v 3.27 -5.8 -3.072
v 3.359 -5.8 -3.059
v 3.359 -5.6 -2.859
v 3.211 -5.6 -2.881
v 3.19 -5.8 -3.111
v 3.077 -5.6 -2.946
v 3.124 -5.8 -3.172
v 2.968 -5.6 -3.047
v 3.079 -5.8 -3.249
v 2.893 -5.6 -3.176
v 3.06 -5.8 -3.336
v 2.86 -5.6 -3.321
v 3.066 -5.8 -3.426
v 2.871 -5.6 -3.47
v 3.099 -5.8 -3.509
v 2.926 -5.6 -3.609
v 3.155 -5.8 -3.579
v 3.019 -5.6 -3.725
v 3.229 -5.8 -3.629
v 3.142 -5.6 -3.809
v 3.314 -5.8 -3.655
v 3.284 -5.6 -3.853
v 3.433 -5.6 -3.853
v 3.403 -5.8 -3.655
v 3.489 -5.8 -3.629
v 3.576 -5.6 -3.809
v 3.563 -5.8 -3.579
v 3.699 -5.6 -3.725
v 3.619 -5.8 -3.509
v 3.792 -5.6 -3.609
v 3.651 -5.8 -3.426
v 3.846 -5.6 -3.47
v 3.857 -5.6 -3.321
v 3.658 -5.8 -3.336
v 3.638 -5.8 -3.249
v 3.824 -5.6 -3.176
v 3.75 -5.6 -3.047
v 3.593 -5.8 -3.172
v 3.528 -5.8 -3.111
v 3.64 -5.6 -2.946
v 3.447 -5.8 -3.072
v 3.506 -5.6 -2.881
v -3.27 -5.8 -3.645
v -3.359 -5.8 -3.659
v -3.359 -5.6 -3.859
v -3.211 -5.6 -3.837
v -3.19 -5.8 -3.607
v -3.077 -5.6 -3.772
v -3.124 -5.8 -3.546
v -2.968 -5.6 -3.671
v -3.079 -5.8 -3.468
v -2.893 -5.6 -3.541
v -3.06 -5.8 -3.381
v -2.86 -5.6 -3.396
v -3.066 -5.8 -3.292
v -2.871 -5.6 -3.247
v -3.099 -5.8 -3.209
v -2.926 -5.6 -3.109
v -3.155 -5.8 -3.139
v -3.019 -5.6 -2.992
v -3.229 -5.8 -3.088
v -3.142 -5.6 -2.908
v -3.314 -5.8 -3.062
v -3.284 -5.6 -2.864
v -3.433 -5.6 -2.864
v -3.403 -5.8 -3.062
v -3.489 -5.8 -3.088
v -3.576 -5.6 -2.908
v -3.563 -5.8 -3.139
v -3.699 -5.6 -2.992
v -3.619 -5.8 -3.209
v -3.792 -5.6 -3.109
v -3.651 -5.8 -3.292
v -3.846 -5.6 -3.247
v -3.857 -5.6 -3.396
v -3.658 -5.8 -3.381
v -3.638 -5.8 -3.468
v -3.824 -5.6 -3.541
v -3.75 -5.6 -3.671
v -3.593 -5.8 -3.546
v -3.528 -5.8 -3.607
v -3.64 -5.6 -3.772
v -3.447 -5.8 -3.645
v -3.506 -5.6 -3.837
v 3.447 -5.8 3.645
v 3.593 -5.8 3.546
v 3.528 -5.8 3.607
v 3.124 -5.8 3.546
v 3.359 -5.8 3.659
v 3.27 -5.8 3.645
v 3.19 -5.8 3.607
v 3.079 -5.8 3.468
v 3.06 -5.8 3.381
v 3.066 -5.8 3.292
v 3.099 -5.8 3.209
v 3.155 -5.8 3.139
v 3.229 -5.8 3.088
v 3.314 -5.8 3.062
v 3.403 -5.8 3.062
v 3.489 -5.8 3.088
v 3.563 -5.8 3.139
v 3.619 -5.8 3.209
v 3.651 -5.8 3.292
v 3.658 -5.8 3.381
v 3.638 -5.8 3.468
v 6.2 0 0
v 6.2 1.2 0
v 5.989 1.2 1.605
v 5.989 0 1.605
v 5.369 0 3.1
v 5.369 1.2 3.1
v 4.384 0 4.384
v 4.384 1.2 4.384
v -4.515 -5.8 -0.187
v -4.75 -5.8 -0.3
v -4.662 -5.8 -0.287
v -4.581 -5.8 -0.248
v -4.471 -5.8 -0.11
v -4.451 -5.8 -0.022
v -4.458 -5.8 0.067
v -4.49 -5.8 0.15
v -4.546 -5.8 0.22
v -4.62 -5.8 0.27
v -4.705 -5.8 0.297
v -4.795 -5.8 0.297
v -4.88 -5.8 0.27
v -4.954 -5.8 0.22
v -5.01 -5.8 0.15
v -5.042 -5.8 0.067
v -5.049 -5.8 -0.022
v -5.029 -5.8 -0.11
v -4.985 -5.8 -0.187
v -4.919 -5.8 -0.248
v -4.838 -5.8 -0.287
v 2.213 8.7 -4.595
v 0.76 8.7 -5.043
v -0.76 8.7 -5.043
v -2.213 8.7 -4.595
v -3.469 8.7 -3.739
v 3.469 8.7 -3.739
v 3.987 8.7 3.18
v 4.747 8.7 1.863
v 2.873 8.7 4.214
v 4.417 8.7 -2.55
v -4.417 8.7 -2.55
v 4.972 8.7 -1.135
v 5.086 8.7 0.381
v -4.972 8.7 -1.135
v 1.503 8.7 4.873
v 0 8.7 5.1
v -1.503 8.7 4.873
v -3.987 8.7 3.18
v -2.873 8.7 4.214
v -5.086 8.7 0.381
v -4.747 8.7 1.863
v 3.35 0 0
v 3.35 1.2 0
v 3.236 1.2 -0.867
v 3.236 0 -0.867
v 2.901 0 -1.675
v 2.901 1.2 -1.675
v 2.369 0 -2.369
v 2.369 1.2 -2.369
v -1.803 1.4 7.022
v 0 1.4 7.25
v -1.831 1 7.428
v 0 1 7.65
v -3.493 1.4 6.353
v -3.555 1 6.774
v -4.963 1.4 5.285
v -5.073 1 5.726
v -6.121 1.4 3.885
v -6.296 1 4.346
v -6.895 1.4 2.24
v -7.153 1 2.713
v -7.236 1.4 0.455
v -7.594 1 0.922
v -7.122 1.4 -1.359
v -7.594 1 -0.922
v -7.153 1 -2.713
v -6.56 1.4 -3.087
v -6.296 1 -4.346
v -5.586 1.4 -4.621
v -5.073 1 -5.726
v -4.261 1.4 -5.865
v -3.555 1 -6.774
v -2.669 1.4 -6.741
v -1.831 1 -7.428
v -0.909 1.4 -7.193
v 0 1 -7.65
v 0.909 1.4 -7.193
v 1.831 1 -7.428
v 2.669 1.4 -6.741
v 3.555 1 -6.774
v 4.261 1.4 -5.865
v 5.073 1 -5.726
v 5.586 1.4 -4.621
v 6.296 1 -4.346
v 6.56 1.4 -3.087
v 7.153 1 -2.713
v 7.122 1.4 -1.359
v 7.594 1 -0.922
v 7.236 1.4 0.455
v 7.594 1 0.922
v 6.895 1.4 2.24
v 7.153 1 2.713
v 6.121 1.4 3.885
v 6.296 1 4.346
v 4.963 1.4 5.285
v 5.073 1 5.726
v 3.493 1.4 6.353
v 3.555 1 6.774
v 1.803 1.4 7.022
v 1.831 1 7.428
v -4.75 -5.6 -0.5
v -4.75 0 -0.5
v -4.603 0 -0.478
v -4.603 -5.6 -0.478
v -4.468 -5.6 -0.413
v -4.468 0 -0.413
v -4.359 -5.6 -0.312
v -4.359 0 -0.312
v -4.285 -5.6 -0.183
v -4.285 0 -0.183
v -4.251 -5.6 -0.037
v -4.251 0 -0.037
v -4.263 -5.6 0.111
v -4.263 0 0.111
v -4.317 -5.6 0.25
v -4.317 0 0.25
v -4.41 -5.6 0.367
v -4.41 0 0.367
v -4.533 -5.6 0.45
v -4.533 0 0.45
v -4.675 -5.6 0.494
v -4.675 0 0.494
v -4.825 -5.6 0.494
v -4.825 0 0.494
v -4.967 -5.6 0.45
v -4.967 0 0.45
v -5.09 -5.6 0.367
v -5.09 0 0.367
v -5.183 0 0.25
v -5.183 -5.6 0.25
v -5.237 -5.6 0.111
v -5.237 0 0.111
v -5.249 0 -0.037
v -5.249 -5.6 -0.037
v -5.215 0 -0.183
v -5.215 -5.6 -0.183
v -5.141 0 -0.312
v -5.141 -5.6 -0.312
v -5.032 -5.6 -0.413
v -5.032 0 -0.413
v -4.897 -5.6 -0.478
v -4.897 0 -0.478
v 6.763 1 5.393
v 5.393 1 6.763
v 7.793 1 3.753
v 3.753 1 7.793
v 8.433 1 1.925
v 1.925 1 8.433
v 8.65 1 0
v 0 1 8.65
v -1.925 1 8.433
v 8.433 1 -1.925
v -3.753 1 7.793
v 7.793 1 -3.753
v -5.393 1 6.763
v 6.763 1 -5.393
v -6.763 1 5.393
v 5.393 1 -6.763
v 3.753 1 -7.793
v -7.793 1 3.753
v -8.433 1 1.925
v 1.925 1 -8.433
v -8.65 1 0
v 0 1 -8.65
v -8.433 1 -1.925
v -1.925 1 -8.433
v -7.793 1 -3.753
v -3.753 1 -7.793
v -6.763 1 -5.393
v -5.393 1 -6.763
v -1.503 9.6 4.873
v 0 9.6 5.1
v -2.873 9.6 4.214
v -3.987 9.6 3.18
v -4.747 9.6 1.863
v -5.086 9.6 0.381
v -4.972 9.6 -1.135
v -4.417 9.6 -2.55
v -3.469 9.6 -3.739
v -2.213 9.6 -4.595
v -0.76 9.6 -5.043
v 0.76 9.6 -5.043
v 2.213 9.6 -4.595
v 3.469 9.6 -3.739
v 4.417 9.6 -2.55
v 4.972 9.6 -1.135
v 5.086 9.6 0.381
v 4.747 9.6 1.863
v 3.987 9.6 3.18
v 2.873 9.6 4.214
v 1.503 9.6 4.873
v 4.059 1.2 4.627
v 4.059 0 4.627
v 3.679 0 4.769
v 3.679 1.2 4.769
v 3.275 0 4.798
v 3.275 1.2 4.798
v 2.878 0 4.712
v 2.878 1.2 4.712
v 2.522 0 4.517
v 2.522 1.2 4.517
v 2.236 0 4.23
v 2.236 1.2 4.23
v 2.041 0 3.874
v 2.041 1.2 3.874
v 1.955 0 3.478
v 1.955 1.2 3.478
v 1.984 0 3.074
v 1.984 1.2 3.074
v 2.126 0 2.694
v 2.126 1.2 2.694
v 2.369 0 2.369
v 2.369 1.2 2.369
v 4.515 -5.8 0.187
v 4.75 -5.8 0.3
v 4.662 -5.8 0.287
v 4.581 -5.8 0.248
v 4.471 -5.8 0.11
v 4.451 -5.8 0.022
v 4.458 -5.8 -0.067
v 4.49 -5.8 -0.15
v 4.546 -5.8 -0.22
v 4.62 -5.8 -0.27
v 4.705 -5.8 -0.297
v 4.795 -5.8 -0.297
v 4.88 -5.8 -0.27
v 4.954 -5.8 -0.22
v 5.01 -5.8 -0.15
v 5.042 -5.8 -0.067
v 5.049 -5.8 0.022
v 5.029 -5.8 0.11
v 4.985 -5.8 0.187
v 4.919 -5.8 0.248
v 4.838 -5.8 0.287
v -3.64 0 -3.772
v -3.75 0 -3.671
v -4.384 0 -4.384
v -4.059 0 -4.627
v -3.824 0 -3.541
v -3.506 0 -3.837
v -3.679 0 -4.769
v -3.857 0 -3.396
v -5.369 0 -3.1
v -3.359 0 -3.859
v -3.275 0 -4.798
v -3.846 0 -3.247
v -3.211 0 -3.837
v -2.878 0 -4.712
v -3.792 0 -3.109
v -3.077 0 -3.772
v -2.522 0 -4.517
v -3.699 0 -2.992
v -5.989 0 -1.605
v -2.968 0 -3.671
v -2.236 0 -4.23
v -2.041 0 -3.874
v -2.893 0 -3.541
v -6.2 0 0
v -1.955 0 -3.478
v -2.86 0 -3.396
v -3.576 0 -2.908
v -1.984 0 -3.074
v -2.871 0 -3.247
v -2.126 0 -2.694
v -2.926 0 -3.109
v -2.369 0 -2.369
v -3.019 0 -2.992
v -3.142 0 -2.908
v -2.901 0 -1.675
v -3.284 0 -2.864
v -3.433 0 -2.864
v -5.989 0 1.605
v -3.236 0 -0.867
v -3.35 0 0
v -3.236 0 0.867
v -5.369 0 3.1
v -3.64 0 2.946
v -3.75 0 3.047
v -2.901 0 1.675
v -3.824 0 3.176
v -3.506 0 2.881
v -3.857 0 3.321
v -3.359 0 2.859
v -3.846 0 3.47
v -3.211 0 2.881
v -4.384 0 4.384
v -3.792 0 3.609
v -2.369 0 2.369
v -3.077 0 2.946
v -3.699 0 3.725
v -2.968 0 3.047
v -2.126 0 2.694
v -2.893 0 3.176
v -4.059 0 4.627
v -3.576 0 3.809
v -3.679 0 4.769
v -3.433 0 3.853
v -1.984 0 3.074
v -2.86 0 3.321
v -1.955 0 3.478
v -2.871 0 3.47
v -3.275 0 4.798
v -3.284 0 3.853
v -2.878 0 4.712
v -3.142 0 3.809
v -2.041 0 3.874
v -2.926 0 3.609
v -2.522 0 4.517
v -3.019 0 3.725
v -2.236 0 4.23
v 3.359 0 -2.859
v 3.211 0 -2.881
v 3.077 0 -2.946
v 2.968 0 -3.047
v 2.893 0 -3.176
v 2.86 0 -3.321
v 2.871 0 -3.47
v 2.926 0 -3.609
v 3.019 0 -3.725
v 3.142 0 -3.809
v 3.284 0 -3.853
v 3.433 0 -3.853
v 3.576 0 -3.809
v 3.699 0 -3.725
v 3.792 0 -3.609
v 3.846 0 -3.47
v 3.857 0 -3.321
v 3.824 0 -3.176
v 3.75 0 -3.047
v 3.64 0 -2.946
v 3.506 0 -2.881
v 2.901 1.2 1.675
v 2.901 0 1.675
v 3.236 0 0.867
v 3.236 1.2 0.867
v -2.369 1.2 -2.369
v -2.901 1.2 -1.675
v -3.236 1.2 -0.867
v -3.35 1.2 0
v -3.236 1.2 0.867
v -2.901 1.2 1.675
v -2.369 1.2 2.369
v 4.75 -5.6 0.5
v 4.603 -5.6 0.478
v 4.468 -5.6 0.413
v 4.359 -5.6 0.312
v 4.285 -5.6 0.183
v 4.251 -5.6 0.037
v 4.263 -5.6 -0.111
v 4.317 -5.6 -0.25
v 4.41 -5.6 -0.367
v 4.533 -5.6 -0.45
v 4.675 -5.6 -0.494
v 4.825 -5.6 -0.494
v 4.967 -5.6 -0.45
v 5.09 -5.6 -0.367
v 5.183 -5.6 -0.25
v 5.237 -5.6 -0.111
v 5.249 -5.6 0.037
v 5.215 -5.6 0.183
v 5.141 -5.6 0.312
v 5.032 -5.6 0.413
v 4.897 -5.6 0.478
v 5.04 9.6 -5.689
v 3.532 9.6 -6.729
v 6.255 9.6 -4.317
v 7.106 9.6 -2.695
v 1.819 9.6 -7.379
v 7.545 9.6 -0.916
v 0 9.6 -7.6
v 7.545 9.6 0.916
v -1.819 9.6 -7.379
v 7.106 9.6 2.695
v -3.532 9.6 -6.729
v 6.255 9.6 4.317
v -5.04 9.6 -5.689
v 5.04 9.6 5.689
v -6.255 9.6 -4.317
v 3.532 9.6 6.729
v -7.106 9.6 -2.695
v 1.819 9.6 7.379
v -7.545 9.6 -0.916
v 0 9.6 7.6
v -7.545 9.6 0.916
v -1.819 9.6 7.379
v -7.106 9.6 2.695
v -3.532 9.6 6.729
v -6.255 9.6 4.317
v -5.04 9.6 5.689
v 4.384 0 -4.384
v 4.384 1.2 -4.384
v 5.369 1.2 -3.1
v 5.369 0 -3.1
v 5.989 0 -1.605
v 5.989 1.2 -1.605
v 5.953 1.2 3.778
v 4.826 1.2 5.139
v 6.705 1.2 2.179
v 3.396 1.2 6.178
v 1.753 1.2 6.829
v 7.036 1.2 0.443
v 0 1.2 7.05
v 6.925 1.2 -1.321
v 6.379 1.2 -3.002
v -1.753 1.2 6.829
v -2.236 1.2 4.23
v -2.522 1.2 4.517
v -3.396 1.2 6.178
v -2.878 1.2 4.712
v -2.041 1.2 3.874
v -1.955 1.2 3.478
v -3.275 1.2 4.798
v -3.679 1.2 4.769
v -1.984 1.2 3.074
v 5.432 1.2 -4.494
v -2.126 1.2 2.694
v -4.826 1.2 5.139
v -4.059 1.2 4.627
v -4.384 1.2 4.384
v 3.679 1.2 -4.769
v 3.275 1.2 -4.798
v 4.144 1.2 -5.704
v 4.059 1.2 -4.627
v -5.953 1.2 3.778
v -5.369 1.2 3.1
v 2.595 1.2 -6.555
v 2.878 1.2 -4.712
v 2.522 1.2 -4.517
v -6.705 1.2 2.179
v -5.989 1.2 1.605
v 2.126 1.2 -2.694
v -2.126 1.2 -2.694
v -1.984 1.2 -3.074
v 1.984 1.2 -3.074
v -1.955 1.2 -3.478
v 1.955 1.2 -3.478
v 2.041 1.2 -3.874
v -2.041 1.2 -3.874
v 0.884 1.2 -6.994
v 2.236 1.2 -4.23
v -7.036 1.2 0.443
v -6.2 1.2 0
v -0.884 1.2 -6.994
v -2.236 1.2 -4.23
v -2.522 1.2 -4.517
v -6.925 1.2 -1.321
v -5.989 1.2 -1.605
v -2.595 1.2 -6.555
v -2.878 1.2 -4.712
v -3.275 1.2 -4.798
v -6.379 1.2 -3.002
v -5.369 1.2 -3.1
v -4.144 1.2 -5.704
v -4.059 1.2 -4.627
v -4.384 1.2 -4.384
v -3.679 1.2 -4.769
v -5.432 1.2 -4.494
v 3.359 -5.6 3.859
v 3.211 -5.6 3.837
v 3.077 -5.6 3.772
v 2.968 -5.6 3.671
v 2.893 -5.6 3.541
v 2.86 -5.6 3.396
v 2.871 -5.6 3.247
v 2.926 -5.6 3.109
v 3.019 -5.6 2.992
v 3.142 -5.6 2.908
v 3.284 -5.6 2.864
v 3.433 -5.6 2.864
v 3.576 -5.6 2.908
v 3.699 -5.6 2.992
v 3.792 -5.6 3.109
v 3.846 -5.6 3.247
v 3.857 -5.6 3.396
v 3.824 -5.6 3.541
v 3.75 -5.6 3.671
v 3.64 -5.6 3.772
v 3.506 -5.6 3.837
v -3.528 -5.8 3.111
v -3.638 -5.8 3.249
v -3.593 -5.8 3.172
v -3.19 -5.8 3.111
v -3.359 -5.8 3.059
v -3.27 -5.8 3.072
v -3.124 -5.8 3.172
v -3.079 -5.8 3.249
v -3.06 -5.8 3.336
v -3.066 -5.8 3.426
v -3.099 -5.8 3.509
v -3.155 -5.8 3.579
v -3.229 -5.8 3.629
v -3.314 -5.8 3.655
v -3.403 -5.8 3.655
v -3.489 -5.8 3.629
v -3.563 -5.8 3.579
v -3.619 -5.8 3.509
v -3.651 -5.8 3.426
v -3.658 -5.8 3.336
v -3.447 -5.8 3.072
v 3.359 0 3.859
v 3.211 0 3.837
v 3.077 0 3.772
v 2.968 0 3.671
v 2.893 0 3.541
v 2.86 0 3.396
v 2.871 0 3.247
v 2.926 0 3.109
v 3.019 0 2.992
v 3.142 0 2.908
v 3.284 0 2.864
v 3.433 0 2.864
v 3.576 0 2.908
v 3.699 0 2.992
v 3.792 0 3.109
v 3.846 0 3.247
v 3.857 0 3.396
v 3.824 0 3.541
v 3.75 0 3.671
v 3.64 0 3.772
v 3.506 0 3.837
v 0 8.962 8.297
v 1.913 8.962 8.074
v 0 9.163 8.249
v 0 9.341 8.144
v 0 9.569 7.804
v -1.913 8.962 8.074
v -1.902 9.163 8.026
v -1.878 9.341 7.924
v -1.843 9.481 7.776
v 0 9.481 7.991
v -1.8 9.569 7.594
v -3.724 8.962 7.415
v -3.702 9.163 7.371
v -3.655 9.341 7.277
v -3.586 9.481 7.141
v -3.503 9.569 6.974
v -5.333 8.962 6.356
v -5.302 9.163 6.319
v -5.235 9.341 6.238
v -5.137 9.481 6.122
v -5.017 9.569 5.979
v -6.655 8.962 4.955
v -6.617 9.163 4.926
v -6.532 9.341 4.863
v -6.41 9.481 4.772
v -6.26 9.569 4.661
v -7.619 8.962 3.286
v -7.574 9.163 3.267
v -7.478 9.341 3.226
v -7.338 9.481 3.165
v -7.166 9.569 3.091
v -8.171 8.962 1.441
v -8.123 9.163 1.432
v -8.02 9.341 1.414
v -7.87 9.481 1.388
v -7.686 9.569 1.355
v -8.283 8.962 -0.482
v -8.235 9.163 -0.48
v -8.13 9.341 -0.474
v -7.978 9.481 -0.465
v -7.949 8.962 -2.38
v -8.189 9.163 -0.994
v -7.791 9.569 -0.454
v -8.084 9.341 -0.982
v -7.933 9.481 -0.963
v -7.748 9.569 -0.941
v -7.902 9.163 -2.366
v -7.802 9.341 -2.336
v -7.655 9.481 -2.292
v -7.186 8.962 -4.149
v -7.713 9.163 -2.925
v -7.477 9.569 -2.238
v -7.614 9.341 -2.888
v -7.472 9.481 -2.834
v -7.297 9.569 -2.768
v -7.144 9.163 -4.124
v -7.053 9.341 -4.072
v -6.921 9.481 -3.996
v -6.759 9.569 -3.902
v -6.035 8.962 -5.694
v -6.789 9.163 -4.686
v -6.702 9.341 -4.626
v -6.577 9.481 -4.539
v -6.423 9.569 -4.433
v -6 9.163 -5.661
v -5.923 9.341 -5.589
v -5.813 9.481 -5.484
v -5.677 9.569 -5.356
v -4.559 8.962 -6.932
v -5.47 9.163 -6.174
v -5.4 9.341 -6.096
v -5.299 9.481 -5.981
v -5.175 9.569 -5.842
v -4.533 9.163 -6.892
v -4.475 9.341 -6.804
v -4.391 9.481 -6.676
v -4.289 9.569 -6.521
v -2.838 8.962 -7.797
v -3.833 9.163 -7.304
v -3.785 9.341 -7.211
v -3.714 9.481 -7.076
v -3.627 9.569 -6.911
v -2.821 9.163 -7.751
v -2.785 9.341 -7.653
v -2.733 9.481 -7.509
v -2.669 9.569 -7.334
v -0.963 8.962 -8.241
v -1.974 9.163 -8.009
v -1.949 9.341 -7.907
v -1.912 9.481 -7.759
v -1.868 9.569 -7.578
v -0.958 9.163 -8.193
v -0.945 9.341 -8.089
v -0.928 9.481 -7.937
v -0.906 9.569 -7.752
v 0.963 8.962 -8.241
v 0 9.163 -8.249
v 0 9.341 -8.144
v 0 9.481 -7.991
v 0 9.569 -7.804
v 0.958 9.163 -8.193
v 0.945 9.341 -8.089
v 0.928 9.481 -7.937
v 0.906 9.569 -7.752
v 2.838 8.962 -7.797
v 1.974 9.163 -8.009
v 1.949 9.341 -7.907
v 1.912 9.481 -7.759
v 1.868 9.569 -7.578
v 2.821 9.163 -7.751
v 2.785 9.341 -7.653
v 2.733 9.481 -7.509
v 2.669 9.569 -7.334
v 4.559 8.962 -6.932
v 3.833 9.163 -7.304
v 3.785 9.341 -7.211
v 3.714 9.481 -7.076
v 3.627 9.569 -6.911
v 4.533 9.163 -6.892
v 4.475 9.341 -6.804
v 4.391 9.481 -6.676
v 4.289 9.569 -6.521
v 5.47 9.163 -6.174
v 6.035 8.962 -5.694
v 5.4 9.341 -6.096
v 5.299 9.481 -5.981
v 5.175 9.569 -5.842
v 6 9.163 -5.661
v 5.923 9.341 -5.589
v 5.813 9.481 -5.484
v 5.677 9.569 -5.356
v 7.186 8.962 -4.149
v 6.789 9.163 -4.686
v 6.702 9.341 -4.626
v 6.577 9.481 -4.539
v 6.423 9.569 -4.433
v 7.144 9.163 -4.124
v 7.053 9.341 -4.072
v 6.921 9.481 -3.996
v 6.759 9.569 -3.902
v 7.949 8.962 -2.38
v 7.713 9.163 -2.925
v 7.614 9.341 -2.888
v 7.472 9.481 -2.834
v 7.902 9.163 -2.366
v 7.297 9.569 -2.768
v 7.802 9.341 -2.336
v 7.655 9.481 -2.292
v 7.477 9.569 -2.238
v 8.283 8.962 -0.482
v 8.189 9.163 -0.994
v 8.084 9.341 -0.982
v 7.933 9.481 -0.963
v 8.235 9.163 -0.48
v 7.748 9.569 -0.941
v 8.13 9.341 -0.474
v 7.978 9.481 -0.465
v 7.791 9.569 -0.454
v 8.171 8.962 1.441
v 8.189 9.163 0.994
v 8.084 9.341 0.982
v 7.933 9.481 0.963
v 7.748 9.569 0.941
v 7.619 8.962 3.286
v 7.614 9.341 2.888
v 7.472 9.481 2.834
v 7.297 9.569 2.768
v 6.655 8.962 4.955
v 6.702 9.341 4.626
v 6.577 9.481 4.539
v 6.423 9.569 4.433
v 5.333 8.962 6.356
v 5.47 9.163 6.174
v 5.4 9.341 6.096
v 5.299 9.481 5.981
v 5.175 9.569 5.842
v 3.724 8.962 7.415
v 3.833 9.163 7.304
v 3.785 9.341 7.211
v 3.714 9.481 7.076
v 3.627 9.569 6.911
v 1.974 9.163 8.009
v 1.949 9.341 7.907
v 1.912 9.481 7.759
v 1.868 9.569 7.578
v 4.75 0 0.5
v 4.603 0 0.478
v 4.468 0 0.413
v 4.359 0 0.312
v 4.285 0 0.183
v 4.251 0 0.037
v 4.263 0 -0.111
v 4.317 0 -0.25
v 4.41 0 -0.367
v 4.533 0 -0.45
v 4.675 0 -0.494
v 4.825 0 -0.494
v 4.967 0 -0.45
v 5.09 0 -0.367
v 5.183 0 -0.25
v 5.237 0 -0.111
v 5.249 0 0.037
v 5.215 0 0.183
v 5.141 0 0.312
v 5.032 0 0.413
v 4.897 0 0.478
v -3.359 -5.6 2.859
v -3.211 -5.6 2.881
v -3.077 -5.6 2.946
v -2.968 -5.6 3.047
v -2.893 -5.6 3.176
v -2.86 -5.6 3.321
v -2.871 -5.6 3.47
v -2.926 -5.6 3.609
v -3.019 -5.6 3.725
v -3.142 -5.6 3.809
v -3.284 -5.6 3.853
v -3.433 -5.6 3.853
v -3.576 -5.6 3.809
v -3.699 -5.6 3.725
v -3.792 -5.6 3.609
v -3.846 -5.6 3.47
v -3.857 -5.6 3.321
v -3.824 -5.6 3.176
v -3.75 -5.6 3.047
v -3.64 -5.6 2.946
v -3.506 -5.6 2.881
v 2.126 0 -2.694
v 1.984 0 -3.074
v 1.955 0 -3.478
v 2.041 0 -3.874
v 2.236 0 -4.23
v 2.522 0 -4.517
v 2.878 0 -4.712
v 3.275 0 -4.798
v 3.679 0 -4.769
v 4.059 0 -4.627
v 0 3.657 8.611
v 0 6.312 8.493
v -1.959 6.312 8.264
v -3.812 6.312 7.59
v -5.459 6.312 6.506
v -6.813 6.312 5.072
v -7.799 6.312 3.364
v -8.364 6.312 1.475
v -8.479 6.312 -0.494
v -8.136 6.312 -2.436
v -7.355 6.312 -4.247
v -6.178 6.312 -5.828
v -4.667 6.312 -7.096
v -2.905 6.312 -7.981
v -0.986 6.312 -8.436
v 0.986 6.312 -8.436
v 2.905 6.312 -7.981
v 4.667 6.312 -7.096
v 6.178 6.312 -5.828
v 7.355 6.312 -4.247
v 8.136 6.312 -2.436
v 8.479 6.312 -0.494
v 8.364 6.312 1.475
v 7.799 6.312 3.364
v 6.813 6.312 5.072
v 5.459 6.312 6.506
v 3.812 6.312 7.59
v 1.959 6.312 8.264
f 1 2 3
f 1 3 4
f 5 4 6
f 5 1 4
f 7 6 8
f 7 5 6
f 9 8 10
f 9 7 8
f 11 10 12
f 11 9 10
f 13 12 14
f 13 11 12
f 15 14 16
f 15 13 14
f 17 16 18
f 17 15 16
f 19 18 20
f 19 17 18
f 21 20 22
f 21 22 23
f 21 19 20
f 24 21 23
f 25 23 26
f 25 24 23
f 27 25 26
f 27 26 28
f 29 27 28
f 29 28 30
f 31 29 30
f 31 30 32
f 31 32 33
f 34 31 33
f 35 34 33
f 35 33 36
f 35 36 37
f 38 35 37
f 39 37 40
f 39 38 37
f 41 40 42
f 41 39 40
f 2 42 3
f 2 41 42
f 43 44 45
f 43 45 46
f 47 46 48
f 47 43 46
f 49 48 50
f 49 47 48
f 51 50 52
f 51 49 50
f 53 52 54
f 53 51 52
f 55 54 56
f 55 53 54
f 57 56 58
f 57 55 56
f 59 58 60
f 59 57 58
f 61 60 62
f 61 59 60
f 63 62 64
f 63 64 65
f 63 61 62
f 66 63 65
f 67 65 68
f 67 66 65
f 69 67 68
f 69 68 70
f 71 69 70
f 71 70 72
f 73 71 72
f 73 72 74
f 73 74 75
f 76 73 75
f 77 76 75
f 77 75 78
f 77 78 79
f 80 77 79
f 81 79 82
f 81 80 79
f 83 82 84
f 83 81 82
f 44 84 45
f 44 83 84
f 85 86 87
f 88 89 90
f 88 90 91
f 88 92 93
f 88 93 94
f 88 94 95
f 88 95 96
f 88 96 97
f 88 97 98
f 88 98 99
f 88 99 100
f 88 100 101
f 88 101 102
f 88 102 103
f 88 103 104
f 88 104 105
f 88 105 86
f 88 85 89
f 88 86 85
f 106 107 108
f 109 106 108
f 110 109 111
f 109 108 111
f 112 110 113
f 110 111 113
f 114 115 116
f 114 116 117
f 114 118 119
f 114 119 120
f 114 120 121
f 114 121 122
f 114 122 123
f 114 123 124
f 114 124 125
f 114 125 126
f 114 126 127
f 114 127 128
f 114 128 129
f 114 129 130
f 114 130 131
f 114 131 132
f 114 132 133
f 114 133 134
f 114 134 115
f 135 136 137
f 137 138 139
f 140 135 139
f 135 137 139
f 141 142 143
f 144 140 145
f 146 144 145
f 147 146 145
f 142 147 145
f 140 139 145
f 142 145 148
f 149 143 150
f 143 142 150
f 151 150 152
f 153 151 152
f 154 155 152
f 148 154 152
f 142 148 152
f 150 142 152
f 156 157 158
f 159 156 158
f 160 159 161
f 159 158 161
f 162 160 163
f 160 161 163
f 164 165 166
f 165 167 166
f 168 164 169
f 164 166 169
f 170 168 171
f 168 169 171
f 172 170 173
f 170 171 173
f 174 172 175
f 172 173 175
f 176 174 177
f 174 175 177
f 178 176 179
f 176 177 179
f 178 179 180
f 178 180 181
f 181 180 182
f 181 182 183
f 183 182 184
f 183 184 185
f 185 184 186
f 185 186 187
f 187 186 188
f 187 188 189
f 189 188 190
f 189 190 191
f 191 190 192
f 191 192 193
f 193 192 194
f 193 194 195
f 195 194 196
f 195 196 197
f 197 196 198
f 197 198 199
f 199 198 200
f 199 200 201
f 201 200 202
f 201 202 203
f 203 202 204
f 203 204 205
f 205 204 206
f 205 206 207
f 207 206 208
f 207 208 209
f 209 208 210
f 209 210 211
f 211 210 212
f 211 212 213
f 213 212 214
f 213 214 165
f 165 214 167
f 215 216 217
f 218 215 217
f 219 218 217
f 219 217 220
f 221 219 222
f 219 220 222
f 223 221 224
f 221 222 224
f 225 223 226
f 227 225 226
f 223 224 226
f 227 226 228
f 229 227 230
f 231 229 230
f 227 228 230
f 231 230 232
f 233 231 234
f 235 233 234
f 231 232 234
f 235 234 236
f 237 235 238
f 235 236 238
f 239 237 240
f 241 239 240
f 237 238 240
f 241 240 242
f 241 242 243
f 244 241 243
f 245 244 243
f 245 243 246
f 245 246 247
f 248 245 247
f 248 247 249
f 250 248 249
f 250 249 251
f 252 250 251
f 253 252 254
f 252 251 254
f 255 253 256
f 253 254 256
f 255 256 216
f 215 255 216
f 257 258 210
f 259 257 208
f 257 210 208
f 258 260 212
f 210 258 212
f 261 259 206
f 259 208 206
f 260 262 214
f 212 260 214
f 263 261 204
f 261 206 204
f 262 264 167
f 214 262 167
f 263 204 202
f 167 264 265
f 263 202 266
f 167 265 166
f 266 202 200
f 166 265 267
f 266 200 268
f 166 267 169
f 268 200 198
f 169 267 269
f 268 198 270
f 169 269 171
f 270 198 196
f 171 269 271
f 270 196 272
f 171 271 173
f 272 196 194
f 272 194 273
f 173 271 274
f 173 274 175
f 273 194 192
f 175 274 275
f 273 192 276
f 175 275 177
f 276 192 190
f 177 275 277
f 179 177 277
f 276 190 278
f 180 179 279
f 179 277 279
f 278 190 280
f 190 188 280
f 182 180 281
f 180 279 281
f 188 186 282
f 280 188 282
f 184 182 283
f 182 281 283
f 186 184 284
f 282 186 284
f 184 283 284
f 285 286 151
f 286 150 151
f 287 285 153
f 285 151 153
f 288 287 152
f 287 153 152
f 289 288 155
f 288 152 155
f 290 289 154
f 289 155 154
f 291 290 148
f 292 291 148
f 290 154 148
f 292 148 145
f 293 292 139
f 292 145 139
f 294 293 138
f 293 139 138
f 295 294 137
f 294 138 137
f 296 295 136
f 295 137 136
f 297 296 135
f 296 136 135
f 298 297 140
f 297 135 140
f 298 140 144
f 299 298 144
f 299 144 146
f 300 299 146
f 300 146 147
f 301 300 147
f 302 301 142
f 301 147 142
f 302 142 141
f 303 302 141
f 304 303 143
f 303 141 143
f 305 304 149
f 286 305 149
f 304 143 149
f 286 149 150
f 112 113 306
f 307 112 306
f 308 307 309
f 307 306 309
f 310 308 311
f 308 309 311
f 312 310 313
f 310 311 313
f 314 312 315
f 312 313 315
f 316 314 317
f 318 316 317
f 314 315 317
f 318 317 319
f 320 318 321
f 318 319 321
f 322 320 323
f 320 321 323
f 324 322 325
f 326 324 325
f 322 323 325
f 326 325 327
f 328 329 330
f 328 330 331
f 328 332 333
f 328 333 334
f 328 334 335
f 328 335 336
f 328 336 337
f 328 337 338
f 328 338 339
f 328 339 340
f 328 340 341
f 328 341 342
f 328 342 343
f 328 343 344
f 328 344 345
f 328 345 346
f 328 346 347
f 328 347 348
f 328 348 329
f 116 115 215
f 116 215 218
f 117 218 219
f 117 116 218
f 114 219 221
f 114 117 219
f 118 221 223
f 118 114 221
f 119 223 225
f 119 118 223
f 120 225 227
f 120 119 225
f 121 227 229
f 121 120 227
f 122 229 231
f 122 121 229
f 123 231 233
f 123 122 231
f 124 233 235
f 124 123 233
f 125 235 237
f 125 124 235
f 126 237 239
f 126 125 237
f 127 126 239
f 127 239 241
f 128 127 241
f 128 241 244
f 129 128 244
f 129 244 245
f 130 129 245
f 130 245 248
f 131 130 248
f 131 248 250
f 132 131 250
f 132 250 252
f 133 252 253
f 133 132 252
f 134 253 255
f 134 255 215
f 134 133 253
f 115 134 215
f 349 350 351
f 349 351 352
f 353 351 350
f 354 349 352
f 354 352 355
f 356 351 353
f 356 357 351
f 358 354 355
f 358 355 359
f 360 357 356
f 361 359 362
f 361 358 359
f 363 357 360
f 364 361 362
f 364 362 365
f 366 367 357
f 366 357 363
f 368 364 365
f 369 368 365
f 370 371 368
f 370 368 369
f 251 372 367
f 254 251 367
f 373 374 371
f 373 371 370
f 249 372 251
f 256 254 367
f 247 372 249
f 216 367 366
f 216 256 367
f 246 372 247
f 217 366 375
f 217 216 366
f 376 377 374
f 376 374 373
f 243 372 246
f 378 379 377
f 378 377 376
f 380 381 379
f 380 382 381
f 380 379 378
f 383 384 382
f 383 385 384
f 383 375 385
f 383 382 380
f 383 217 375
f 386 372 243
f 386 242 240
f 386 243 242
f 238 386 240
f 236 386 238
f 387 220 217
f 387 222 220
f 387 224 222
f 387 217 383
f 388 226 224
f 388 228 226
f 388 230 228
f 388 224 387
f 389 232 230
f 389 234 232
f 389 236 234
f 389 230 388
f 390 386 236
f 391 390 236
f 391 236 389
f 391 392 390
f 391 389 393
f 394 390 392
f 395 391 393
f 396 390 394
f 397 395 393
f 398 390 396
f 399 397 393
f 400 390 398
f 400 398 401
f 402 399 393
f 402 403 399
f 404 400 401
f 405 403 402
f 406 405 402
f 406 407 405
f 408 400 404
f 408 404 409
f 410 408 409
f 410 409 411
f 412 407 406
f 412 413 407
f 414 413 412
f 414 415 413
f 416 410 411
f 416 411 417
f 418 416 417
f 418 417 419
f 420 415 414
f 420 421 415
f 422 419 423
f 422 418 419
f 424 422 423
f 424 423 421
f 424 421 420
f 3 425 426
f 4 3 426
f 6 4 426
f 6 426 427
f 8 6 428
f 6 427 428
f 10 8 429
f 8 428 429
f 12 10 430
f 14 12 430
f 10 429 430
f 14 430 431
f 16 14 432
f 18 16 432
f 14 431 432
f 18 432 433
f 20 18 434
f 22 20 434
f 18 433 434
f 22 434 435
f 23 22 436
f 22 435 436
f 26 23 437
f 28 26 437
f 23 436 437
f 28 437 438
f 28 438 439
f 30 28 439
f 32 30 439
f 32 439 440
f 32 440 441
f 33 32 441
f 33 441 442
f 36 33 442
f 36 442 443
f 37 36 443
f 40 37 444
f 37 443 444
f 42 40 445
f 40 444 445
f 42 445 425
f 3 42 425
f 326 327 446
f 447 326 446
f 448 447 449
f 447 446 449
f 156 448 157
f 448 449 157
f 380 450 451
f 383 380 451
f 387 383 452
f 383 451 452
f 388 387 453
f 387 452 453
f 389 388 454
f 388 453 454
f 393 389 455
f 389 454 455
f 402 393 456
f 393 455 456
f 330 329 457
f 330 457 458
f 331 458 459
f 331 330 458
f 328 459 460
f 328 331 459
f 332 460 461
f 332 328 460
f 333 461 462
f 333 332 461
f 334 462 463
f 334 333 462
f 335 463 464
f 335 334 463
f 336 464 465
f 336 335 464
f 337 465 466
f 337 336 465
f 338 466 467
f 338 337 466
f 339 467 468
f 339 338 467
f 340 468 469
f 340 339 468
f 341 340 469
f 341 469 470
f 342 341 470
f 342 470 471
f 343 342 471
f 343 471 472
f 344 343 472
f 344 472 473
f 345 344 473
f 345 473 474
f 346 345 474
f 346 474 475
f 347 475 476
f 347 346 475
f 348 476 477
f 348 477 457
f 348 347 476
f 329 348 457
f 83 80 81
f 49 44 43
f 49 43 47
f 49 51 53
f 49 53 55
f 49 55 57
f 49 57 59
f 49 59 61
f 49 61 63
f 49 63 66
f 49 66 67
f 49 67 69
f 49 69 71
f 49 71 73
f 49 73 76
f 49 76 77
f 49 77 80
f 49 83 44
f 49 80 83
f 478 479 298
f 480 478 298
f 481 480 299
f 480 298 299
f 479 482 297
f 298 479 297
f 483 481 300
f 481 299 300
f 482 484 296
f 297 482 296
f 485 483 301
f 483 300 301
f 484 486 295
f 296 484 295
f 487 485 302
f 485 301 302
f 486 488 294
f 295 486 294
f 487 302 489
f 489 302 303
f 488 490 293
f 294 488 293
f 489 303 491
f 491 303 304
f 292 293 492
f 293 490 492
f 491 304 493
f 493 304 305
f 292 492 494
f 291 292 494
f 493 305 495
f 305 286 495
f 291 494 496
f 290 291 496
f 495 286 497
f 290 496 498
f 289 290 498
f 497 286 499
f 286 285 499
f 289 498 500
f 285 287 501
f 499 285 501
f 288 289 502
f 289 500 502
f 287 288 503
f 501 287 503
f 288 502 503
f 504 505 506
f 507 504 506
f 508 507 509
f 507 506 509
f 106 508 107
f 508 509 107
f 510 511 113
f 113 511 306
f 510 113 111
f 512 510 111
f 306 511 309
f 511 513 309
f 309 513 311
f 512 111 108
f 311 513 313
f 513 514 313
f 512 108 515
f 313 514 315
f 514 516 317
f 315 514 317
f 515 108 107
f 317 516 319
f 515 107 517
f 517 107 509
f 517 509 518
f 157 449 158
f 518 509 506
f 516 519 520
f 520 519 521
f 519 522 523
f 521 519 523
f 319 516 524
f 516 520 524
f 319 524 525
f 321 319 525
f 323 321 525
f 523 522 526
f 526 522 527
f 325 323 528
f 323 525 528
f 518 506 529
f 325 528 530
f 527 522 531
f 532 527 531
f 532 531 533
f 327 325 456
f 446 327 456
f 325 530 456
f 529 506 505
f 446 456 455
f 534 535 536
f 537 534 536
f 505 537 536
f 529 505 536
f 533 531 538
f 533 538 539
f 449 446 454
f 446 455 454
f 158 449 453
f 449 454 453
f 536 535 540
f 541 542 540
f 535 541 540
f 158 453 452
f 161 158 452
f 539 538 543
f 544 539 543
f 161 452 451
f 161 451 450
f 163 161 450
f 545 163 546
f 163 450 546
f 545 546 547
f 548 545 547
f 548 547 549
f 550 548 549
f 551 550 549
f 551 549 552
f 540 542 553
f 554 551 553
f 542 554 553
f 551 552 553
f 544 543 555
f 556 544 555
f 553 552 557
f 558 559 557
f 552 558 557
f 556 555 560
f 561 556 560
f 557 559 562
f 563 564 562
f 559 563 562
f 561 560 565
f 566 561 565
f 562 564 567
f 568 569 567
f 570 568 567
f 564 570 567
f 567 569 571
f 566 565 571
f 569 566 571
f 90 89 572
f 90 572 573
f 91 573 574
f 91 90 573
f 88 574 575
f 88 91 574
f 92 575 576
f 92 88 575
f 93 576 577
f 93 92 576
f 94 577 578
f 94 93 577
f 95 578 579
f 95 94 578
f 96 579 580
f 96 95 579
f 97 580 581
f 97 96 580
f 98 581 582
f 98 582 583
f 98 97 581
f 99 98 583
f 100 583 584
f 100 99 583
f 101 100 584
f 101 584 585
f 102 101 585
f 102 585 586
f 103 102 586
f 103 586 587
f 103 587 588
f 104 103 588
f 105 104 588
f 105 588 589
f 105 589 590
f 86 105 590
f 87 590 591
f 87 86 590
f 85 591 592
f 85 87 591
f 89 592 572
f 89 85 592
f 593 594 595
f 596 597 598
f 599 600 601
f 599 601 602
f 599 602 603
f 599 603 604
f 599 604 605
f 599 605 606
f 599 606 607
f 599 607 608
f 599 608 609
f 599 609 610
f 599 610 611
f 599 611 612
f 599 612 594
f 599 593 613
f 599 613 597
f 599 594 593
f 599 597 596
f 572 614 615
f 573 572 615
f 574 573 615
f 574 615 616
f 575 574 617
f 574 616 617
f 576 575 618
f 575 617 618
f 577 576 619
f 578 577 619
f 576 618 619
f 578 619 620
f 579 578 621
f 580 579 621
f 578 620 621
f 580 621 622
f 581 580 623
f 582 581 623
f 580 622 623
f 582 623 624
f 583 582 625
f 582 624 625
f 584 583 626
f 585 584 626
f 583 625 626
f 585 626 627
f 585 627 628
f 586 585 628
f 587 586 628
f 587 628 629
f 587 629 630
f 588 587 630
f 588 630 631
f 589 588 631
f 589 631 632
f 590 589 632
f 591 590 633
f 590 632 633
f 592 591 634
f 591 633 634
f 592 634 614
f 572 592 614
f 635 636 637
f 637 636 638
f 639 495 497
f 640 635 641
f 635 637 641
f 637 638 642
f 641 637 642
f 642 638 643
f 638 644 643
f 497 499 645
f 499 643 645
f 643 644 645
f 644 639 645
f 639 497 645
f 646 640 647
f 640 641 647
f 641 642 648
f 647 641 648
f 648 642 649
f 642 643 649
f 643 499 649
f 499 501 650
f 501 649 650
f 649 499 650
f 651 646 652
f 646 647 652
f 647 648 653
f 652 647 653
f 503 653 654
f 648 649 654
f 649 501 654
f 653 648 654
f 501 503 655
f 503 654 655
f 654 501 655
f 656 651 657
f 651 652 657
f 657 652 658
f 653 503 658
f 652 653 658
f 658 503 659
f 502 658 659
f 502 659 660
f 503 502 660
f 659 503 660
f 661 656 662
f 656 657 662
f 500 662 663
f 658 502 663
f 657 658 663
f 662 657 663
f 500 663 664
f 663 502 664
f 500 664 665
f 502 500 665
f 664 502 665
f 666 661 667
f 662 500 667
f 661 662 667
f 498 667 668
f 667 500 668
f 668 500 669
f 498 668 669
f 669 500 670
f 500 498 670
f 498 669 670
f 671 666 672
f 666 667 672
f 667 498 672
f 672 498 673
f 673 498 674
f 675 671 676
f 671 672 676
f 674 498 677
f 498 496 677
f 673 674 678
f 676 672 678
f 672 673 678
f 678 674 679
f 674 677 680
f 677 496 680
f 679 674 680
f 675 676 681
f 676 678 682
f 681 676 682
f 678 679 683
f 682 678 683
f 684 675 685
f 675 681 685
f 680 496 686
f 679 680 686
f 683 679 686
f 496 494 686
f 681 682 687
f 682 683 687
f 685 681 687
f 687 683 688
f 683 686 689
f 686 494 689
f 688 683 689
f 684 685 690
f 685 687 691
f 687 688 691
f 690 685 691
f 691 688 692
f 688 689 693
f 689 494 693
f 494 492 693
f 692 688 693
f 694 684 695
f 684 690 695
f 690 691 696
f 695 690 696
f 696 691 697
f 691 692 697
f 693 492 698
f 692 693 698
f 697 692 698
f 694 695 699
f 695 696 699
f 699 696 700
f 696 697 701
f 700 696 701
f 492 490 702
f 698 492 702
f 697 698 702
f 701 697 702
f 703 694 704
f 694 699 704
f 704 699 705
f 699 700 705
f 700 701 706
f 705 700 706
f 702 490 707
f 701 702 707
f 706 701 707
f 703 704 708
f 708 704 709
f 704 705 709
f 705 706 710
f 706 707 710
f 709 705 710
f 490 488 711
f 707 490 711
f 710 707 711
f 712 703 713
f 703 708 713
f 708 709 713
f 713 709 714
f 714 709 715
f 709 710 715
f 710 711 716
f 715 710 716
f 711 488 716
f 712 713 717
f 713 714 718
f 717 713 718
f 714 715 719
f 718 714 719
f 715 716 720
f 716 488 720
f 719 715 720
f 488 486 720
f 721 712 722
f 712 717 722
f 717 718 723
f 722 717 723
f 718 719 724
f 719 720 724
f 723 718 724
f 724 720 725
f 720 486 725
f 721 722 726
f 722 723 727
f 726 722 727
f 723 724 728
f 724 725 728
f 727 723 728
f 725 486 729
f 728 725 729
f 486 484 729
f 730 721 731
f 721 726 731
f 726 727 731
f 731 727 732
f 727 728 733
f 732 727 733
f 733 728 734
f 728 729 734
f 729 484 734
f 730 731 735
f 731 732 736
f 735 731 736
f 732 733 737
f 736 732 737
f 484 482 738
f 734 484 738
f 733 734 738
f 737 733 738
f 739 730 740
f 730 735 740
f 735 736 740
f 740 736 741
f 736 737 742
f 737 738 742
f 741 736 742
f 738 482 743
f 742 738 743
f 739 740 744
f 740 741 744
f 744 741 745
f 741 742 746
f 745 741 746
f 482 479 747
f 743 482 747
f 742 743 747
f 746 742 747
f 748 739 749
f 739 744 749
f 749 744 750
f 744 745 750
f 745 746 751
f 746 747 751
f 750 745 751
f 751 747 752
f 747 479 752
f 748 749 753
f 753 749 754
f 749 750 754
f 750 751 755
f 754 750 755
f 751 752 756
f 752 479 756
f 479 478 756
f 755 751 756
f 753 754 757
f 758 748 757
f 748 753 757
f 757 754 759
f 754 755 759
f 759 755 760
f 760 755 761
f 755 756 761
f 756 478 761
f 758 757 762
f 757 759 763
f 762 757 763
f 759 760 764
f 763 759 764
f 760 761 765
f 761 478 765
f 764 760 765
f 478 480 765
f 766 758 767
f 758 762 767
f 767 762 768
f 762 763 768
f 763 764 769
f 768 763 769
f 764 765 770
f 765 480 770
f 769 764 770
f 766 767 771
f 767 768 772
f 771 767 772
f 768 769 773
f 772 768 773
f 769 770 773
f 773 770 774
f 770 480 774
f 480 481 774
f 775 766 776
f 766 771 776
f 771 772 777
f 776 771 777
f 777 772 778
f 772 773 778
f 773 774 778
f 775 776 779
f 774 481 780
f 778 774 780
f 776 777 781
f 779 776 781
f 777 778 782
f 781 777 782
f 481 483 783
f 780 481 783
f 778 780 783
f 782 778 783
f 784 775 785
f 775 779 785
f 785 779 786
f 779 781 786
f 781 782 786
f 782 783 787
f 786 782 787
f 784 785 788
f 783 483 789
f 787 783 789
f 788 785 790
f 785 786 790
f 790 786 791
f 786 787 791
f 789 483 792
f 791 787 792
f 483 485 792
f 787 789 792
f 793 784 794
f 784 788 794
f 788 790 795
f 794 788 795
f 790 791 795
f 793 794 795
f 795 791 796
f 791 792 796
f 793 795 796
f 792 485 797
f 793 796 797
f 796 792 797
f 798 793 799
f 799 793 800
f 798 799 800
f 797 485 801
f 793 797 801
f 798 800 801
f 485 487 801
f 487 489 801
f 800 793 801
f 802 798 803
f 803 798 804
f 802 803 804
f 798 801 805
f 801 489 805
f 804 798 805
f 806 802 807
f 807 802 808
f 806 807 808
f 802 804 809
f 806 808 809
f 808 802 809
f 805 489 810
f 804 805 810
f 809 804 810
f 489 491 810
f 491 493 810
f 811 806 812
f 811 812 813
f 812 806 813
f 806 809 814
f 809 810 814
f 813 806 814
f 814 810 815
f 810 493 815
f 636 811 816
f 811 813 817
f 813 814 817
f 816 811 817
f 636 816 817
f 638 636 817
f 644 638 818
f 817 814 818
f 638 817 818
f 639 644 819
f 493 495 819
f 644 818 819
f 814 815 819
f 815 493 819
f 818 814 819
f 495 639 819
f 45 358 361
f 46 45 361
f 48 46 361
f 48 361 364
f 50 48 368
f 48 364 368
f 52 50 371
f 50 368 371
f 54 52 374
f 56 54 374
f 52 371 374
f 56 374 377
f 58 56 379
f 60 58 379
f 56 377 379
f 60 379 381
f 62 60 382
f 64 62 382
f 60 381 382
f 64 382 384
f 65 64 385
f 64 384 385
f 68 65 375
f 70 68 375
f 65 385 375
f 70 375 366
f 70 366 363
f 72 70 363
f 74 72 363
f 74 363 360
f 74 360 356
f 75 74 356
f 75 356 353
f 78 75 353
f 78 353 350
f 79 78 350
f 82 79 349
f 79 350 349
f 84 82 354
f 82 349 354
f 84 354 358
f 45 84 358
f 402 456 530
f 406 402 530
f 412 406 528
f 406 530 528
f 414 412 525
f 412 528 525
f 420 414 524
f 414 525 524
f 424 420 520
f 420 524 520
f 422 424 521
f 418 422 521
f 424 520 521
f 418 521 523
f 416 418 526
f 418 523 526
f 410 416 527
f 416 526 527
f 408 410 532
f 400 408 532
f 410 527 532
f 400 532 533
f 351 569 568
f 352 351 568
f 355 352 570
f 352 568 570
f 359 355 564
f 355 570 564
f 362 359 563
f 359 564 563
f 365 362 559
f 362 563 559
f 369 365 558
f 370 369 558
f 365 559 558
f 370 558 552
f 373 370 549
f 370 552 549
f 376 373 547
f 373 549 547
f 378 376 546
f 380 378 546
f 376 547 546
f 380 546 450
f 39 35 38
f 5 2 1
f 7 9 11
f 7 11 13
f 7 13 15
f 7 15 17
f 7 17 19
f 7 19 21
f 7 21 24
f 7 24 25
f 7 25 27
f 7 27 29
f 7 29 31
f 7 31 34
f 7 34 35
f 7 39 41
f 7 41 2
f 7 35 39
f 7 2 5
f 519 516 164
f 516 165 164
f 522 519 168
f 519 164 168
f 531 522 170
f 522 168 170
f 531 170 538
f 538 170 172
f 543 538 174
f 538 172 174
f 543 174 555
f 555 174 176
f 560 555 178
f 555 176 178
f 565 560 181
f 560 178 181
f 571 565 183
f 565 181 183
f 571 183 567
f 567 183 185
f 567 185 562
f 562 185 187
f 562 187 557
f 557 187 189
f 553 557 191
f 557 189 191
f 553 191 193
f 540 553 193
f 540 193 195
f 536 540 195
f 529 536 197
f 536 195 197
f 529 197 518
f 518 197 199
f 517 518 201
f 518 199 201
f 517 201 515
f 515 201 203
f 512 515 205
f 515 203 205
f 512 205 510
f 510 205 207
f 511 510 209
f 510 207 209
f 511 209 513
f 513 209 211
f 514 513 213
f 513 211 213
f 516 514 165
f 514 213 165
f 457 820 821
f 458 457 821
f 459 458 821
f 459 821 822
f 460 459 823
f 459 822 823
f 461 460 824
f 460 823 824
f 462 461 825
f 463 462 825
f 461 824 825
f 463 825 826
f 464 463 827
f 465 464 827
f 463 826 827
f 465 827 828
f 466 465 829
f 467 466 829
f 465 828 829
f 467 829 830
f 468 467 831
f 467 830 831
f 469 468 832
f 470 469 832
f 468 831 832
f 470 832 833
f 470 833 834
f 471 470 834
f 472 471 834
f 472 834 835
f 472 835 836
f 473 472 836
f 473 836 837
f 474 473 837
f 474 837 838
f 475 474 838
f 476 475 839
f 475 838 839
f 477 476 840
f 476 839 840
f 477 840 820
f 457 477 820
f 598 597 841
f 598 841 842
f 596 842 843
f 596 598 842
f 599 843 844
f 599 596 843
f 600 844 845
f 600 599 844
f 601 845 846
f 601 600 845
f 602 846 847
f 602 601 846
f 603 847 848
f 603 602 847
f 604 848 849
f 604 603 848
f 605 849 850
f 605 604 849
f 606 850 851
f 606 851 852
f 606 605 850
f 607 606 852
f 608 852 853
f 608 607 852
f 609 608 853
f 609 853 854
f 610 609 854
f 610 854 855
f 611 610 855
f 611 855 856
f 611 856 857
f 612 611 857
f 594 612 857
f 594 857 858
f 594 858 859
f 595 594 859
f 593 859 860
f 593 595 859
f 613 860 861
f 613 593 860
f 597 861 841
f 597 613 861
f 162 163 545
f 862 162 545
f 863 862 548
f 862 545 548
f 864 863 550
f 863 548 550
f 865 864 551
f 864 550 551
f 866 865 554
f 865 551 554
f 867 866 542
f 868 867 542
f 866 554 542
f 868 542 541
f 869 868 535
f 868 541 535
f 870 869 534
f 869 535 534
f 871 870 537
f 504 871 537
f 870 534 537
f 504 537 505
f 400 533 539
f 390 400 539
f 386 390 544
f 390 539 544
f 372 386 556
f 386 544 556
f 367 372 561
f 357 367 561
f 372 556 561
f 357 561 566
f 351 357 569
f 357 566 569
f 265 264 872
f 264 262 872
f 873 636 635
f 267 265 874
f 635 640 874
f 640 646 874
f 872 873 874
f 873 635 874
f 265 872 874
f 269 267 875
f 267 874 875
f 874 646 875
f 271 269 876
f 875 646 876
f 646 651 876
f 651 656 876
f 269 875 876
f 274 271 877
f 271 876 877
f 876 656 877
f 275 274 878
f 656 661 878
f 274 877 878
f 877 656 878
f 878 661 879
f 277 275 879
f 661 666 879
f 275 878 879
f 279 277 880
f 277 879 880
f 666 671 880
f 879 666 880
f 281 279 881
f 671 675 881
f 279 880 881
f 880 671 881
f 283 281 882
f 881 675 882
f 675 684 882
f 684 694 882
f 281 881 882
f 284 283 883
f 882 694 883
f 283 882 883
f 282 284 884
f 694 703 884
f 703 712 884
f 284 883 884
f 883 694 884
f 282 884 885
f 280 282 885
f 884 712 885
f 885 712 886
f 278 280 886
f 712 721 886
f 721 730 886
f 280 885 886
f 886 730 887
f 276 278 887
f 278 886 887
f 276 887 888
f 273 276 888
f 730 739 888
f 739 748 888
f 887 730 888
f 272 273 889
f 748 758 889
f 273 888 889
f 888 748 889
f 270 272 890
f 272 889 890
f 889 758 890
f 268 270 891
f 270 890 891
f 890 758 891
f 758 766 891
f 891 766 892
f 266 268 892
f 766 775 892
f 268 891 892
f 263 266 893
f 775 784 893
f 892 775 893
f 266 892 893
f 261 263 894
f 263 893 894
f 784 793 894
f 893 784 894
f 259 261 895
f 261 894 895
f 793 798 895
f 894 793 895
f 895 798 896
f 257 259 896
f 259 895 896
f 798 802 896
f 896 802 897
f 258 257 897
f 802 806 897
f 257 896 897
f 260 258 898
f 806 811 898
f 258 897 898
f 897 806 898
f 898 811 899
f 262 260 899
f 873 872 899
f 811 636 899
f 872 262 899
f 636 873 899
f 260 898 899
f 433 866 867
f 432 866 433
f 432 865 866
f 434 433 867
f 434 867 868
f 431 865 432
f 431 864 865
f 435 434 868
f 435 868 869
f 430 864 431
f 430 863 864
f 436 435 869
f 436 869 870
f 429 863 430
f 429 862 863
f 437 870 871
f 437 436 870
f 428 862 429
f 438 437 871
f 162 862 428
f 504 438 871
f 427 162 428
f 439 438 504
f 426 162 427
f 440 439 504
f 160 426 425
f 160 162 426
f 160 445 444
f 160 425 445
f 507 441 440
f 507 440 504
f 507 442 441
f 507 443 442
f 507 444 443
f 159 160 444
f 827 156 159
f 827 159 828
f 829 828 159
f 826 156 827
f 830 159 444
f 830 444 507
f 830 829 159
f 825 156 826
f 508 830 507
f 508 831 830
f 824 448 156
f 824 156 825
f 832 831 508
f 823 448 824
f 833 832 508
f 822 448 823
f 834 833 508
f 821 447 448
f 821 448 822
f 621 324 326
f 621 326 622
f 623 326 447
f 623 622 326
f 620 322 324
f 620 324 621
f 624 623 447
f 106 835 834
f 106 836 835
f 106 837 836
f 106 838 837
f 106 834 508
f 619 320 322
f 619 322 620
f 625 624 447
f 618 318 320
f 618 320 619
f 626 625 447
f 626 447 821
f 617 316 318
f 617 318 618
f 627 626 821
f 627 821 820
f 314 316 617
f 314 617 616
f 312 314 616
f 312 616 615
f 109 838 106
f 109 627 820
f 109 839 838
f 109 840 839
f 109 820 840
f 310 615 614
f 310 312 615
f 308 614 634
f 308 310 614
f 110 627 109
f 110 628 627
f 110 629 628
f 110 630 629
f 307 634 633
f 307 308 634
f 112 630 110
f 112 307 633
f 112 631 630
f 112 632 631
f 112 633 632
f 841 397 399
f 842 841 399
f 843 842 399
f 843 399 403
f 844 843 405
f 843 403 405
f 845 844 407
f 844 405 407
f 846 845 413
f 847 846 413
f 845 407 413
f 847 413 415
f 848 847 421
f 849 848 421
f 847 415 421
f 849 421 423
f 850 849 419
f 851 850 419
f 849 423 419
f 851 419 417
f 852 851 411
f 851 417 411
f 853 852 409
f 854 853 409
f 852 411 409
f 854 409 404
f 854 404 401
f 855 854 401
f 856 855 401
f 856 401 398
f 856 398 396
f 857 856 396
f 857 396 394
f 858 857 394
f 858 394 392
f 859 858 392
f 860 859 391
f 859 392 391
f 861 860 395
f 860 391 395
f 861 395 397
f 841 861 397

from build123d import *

# Parameters (mm, degrees)
EXTRUDE_1_DEPTH = 1.2
SKETCH_3_R      = 0.5
EXTRUDE_2_DEPTH = 5.8
CHAMFER_1_SIZE  = 0.2


with BuildPart() as part:
    # Эскиз1 → Повернуть1 (revolve)
    with BuildSketch(Plane(origin=(0, 0, 0), x_dir=(0, 0, -1), z_dir=(1, 0, 0))):
        with BuildLine():
            Line((0, 1.2), (-7.05, 1.2))
            Line((-7.05, 1.2), (-7.25, 1.4))
            Line((-7.25, 1.4), (-7.65, 1))
            Line((-7.65, 1), (-8.65, 1))
            ThreePointArc((-8.65, 1), (-8.561771126, 4.984856949), (-8.297257426, 8.96190381))
            ThreePointArc((-8.297257426, 8.96190381), (-8.072581915, 9.416397457), (-7.6, 9.6))
            Line((-7.6, 9.6), (-5.1, 9.6))
            Line((-5.1, 9.6), (-5.1, 8.7))
            Line((-5.1, 8.7), (0, 8.7))
            Line((0, 8.7), (0, 1.2))
        make_face()
    revolve(axis=Axis((0, 8.7, 0), (0, -1, 0)))

    # Эскиз2 → Бобышка-Вытянуть1 (add)
    with BuildSketch(Plane.XZ.offset(-1.2)):
        with BuildLine():
            ThreePointArc((-2.368807717, 2.368807717), (-2.368807717, 4.384062043), (-4.384062043, 4.384062043))
            ThreePointArc((-4.384062043, 4.384062043), (-6.2, 0), (-4.384062043, -4.384062043))
            ThreePointArc((-4.384062043, -4.384062043), (-2.368807717, -4.384062043), (-2.368807717, -2.368807717))
            ThreePointArc((-2.368807717, -2.368807717), (-3.35, 0), (-2.368807717, 2.368807717))
        make_face()
        with BuildLine():
            ThreePointArc((4.384062043, -4.384062043), (5.728053102, -2.372637281), (6.2, 0))
            ThreePointArc((6.2, 0), (5.728053102, 2.372637281), (4.384062043, 4.384062043))
            ThreePointArc((4.384062043, 4.384062043), (2.368807717, 4.384062043), (2.368807717, 2.368807717))
            ThreePointArc((2.368807717, 2.368807717), (3.094996434, 1.281989498), (3.35, 0))
            ThreePointArc((3.35, 0), (3.094996434, -1.281989498), (2.368807717, -2.368807717))
            ThreePointArc((2.368807717, -2.368807717), (2.368807717, -4.384062043), (4.384062043, -4.384062043))
        make_face()
    extrude(amount=EXTRUDE_1_DEPTH)

    # Эскиз3 → Бобышка-Вытянуть2 (add)
    with BuildSketch(Plane.XZ):
        with Locations(Location((-4.75, 0, 0), (0, 0, 270))):
            Circle(SKETCH_3_R)
        with Locations(Location((-3.358757211, 3.358757211, 0), (0, 0, 270))):
            Circle(SKETCH_3_R)
        with Locations(Location((-3.358757211, -3.358757211, 0), (0, 0, 270))):
            Circle(SKETCH_3_R)
        with Locations(Location((3.358757211, 3.358757211, 0), (0, 0, 90))):
            Circle(SKETCH_3_R)
        with Locations(Location((4.75, 0, 0), (0, 0, 90))):
            Circle(SKETCH_3_R)
        with Locations(Location((3.358757211, -3.358757211, 0), (0, 0, 90))):
            Circle(SKETCH_3_R)
    extrude(amount=EXTRUDE_2_DEPTH)

    # Фаска1
    chamfer_1_edges = [part.edges().sort_by_distance(p)[0] for p in [
        (-4.75, -5.8, 0.5),
        (-3.358757211, -5.8, 3.858757211),
        (-3.358757211, -5.8, -2.858757211),
        (3.358757211, -5.8, 2.858757211),
        (4.75, -5.8, -0.5),
        (3.358757211, -5.8, -3.858757211),
    ]]
    chamfer(chamfer_1_edges, length=CHAMFER_1_SIZE)


solid = part.part
